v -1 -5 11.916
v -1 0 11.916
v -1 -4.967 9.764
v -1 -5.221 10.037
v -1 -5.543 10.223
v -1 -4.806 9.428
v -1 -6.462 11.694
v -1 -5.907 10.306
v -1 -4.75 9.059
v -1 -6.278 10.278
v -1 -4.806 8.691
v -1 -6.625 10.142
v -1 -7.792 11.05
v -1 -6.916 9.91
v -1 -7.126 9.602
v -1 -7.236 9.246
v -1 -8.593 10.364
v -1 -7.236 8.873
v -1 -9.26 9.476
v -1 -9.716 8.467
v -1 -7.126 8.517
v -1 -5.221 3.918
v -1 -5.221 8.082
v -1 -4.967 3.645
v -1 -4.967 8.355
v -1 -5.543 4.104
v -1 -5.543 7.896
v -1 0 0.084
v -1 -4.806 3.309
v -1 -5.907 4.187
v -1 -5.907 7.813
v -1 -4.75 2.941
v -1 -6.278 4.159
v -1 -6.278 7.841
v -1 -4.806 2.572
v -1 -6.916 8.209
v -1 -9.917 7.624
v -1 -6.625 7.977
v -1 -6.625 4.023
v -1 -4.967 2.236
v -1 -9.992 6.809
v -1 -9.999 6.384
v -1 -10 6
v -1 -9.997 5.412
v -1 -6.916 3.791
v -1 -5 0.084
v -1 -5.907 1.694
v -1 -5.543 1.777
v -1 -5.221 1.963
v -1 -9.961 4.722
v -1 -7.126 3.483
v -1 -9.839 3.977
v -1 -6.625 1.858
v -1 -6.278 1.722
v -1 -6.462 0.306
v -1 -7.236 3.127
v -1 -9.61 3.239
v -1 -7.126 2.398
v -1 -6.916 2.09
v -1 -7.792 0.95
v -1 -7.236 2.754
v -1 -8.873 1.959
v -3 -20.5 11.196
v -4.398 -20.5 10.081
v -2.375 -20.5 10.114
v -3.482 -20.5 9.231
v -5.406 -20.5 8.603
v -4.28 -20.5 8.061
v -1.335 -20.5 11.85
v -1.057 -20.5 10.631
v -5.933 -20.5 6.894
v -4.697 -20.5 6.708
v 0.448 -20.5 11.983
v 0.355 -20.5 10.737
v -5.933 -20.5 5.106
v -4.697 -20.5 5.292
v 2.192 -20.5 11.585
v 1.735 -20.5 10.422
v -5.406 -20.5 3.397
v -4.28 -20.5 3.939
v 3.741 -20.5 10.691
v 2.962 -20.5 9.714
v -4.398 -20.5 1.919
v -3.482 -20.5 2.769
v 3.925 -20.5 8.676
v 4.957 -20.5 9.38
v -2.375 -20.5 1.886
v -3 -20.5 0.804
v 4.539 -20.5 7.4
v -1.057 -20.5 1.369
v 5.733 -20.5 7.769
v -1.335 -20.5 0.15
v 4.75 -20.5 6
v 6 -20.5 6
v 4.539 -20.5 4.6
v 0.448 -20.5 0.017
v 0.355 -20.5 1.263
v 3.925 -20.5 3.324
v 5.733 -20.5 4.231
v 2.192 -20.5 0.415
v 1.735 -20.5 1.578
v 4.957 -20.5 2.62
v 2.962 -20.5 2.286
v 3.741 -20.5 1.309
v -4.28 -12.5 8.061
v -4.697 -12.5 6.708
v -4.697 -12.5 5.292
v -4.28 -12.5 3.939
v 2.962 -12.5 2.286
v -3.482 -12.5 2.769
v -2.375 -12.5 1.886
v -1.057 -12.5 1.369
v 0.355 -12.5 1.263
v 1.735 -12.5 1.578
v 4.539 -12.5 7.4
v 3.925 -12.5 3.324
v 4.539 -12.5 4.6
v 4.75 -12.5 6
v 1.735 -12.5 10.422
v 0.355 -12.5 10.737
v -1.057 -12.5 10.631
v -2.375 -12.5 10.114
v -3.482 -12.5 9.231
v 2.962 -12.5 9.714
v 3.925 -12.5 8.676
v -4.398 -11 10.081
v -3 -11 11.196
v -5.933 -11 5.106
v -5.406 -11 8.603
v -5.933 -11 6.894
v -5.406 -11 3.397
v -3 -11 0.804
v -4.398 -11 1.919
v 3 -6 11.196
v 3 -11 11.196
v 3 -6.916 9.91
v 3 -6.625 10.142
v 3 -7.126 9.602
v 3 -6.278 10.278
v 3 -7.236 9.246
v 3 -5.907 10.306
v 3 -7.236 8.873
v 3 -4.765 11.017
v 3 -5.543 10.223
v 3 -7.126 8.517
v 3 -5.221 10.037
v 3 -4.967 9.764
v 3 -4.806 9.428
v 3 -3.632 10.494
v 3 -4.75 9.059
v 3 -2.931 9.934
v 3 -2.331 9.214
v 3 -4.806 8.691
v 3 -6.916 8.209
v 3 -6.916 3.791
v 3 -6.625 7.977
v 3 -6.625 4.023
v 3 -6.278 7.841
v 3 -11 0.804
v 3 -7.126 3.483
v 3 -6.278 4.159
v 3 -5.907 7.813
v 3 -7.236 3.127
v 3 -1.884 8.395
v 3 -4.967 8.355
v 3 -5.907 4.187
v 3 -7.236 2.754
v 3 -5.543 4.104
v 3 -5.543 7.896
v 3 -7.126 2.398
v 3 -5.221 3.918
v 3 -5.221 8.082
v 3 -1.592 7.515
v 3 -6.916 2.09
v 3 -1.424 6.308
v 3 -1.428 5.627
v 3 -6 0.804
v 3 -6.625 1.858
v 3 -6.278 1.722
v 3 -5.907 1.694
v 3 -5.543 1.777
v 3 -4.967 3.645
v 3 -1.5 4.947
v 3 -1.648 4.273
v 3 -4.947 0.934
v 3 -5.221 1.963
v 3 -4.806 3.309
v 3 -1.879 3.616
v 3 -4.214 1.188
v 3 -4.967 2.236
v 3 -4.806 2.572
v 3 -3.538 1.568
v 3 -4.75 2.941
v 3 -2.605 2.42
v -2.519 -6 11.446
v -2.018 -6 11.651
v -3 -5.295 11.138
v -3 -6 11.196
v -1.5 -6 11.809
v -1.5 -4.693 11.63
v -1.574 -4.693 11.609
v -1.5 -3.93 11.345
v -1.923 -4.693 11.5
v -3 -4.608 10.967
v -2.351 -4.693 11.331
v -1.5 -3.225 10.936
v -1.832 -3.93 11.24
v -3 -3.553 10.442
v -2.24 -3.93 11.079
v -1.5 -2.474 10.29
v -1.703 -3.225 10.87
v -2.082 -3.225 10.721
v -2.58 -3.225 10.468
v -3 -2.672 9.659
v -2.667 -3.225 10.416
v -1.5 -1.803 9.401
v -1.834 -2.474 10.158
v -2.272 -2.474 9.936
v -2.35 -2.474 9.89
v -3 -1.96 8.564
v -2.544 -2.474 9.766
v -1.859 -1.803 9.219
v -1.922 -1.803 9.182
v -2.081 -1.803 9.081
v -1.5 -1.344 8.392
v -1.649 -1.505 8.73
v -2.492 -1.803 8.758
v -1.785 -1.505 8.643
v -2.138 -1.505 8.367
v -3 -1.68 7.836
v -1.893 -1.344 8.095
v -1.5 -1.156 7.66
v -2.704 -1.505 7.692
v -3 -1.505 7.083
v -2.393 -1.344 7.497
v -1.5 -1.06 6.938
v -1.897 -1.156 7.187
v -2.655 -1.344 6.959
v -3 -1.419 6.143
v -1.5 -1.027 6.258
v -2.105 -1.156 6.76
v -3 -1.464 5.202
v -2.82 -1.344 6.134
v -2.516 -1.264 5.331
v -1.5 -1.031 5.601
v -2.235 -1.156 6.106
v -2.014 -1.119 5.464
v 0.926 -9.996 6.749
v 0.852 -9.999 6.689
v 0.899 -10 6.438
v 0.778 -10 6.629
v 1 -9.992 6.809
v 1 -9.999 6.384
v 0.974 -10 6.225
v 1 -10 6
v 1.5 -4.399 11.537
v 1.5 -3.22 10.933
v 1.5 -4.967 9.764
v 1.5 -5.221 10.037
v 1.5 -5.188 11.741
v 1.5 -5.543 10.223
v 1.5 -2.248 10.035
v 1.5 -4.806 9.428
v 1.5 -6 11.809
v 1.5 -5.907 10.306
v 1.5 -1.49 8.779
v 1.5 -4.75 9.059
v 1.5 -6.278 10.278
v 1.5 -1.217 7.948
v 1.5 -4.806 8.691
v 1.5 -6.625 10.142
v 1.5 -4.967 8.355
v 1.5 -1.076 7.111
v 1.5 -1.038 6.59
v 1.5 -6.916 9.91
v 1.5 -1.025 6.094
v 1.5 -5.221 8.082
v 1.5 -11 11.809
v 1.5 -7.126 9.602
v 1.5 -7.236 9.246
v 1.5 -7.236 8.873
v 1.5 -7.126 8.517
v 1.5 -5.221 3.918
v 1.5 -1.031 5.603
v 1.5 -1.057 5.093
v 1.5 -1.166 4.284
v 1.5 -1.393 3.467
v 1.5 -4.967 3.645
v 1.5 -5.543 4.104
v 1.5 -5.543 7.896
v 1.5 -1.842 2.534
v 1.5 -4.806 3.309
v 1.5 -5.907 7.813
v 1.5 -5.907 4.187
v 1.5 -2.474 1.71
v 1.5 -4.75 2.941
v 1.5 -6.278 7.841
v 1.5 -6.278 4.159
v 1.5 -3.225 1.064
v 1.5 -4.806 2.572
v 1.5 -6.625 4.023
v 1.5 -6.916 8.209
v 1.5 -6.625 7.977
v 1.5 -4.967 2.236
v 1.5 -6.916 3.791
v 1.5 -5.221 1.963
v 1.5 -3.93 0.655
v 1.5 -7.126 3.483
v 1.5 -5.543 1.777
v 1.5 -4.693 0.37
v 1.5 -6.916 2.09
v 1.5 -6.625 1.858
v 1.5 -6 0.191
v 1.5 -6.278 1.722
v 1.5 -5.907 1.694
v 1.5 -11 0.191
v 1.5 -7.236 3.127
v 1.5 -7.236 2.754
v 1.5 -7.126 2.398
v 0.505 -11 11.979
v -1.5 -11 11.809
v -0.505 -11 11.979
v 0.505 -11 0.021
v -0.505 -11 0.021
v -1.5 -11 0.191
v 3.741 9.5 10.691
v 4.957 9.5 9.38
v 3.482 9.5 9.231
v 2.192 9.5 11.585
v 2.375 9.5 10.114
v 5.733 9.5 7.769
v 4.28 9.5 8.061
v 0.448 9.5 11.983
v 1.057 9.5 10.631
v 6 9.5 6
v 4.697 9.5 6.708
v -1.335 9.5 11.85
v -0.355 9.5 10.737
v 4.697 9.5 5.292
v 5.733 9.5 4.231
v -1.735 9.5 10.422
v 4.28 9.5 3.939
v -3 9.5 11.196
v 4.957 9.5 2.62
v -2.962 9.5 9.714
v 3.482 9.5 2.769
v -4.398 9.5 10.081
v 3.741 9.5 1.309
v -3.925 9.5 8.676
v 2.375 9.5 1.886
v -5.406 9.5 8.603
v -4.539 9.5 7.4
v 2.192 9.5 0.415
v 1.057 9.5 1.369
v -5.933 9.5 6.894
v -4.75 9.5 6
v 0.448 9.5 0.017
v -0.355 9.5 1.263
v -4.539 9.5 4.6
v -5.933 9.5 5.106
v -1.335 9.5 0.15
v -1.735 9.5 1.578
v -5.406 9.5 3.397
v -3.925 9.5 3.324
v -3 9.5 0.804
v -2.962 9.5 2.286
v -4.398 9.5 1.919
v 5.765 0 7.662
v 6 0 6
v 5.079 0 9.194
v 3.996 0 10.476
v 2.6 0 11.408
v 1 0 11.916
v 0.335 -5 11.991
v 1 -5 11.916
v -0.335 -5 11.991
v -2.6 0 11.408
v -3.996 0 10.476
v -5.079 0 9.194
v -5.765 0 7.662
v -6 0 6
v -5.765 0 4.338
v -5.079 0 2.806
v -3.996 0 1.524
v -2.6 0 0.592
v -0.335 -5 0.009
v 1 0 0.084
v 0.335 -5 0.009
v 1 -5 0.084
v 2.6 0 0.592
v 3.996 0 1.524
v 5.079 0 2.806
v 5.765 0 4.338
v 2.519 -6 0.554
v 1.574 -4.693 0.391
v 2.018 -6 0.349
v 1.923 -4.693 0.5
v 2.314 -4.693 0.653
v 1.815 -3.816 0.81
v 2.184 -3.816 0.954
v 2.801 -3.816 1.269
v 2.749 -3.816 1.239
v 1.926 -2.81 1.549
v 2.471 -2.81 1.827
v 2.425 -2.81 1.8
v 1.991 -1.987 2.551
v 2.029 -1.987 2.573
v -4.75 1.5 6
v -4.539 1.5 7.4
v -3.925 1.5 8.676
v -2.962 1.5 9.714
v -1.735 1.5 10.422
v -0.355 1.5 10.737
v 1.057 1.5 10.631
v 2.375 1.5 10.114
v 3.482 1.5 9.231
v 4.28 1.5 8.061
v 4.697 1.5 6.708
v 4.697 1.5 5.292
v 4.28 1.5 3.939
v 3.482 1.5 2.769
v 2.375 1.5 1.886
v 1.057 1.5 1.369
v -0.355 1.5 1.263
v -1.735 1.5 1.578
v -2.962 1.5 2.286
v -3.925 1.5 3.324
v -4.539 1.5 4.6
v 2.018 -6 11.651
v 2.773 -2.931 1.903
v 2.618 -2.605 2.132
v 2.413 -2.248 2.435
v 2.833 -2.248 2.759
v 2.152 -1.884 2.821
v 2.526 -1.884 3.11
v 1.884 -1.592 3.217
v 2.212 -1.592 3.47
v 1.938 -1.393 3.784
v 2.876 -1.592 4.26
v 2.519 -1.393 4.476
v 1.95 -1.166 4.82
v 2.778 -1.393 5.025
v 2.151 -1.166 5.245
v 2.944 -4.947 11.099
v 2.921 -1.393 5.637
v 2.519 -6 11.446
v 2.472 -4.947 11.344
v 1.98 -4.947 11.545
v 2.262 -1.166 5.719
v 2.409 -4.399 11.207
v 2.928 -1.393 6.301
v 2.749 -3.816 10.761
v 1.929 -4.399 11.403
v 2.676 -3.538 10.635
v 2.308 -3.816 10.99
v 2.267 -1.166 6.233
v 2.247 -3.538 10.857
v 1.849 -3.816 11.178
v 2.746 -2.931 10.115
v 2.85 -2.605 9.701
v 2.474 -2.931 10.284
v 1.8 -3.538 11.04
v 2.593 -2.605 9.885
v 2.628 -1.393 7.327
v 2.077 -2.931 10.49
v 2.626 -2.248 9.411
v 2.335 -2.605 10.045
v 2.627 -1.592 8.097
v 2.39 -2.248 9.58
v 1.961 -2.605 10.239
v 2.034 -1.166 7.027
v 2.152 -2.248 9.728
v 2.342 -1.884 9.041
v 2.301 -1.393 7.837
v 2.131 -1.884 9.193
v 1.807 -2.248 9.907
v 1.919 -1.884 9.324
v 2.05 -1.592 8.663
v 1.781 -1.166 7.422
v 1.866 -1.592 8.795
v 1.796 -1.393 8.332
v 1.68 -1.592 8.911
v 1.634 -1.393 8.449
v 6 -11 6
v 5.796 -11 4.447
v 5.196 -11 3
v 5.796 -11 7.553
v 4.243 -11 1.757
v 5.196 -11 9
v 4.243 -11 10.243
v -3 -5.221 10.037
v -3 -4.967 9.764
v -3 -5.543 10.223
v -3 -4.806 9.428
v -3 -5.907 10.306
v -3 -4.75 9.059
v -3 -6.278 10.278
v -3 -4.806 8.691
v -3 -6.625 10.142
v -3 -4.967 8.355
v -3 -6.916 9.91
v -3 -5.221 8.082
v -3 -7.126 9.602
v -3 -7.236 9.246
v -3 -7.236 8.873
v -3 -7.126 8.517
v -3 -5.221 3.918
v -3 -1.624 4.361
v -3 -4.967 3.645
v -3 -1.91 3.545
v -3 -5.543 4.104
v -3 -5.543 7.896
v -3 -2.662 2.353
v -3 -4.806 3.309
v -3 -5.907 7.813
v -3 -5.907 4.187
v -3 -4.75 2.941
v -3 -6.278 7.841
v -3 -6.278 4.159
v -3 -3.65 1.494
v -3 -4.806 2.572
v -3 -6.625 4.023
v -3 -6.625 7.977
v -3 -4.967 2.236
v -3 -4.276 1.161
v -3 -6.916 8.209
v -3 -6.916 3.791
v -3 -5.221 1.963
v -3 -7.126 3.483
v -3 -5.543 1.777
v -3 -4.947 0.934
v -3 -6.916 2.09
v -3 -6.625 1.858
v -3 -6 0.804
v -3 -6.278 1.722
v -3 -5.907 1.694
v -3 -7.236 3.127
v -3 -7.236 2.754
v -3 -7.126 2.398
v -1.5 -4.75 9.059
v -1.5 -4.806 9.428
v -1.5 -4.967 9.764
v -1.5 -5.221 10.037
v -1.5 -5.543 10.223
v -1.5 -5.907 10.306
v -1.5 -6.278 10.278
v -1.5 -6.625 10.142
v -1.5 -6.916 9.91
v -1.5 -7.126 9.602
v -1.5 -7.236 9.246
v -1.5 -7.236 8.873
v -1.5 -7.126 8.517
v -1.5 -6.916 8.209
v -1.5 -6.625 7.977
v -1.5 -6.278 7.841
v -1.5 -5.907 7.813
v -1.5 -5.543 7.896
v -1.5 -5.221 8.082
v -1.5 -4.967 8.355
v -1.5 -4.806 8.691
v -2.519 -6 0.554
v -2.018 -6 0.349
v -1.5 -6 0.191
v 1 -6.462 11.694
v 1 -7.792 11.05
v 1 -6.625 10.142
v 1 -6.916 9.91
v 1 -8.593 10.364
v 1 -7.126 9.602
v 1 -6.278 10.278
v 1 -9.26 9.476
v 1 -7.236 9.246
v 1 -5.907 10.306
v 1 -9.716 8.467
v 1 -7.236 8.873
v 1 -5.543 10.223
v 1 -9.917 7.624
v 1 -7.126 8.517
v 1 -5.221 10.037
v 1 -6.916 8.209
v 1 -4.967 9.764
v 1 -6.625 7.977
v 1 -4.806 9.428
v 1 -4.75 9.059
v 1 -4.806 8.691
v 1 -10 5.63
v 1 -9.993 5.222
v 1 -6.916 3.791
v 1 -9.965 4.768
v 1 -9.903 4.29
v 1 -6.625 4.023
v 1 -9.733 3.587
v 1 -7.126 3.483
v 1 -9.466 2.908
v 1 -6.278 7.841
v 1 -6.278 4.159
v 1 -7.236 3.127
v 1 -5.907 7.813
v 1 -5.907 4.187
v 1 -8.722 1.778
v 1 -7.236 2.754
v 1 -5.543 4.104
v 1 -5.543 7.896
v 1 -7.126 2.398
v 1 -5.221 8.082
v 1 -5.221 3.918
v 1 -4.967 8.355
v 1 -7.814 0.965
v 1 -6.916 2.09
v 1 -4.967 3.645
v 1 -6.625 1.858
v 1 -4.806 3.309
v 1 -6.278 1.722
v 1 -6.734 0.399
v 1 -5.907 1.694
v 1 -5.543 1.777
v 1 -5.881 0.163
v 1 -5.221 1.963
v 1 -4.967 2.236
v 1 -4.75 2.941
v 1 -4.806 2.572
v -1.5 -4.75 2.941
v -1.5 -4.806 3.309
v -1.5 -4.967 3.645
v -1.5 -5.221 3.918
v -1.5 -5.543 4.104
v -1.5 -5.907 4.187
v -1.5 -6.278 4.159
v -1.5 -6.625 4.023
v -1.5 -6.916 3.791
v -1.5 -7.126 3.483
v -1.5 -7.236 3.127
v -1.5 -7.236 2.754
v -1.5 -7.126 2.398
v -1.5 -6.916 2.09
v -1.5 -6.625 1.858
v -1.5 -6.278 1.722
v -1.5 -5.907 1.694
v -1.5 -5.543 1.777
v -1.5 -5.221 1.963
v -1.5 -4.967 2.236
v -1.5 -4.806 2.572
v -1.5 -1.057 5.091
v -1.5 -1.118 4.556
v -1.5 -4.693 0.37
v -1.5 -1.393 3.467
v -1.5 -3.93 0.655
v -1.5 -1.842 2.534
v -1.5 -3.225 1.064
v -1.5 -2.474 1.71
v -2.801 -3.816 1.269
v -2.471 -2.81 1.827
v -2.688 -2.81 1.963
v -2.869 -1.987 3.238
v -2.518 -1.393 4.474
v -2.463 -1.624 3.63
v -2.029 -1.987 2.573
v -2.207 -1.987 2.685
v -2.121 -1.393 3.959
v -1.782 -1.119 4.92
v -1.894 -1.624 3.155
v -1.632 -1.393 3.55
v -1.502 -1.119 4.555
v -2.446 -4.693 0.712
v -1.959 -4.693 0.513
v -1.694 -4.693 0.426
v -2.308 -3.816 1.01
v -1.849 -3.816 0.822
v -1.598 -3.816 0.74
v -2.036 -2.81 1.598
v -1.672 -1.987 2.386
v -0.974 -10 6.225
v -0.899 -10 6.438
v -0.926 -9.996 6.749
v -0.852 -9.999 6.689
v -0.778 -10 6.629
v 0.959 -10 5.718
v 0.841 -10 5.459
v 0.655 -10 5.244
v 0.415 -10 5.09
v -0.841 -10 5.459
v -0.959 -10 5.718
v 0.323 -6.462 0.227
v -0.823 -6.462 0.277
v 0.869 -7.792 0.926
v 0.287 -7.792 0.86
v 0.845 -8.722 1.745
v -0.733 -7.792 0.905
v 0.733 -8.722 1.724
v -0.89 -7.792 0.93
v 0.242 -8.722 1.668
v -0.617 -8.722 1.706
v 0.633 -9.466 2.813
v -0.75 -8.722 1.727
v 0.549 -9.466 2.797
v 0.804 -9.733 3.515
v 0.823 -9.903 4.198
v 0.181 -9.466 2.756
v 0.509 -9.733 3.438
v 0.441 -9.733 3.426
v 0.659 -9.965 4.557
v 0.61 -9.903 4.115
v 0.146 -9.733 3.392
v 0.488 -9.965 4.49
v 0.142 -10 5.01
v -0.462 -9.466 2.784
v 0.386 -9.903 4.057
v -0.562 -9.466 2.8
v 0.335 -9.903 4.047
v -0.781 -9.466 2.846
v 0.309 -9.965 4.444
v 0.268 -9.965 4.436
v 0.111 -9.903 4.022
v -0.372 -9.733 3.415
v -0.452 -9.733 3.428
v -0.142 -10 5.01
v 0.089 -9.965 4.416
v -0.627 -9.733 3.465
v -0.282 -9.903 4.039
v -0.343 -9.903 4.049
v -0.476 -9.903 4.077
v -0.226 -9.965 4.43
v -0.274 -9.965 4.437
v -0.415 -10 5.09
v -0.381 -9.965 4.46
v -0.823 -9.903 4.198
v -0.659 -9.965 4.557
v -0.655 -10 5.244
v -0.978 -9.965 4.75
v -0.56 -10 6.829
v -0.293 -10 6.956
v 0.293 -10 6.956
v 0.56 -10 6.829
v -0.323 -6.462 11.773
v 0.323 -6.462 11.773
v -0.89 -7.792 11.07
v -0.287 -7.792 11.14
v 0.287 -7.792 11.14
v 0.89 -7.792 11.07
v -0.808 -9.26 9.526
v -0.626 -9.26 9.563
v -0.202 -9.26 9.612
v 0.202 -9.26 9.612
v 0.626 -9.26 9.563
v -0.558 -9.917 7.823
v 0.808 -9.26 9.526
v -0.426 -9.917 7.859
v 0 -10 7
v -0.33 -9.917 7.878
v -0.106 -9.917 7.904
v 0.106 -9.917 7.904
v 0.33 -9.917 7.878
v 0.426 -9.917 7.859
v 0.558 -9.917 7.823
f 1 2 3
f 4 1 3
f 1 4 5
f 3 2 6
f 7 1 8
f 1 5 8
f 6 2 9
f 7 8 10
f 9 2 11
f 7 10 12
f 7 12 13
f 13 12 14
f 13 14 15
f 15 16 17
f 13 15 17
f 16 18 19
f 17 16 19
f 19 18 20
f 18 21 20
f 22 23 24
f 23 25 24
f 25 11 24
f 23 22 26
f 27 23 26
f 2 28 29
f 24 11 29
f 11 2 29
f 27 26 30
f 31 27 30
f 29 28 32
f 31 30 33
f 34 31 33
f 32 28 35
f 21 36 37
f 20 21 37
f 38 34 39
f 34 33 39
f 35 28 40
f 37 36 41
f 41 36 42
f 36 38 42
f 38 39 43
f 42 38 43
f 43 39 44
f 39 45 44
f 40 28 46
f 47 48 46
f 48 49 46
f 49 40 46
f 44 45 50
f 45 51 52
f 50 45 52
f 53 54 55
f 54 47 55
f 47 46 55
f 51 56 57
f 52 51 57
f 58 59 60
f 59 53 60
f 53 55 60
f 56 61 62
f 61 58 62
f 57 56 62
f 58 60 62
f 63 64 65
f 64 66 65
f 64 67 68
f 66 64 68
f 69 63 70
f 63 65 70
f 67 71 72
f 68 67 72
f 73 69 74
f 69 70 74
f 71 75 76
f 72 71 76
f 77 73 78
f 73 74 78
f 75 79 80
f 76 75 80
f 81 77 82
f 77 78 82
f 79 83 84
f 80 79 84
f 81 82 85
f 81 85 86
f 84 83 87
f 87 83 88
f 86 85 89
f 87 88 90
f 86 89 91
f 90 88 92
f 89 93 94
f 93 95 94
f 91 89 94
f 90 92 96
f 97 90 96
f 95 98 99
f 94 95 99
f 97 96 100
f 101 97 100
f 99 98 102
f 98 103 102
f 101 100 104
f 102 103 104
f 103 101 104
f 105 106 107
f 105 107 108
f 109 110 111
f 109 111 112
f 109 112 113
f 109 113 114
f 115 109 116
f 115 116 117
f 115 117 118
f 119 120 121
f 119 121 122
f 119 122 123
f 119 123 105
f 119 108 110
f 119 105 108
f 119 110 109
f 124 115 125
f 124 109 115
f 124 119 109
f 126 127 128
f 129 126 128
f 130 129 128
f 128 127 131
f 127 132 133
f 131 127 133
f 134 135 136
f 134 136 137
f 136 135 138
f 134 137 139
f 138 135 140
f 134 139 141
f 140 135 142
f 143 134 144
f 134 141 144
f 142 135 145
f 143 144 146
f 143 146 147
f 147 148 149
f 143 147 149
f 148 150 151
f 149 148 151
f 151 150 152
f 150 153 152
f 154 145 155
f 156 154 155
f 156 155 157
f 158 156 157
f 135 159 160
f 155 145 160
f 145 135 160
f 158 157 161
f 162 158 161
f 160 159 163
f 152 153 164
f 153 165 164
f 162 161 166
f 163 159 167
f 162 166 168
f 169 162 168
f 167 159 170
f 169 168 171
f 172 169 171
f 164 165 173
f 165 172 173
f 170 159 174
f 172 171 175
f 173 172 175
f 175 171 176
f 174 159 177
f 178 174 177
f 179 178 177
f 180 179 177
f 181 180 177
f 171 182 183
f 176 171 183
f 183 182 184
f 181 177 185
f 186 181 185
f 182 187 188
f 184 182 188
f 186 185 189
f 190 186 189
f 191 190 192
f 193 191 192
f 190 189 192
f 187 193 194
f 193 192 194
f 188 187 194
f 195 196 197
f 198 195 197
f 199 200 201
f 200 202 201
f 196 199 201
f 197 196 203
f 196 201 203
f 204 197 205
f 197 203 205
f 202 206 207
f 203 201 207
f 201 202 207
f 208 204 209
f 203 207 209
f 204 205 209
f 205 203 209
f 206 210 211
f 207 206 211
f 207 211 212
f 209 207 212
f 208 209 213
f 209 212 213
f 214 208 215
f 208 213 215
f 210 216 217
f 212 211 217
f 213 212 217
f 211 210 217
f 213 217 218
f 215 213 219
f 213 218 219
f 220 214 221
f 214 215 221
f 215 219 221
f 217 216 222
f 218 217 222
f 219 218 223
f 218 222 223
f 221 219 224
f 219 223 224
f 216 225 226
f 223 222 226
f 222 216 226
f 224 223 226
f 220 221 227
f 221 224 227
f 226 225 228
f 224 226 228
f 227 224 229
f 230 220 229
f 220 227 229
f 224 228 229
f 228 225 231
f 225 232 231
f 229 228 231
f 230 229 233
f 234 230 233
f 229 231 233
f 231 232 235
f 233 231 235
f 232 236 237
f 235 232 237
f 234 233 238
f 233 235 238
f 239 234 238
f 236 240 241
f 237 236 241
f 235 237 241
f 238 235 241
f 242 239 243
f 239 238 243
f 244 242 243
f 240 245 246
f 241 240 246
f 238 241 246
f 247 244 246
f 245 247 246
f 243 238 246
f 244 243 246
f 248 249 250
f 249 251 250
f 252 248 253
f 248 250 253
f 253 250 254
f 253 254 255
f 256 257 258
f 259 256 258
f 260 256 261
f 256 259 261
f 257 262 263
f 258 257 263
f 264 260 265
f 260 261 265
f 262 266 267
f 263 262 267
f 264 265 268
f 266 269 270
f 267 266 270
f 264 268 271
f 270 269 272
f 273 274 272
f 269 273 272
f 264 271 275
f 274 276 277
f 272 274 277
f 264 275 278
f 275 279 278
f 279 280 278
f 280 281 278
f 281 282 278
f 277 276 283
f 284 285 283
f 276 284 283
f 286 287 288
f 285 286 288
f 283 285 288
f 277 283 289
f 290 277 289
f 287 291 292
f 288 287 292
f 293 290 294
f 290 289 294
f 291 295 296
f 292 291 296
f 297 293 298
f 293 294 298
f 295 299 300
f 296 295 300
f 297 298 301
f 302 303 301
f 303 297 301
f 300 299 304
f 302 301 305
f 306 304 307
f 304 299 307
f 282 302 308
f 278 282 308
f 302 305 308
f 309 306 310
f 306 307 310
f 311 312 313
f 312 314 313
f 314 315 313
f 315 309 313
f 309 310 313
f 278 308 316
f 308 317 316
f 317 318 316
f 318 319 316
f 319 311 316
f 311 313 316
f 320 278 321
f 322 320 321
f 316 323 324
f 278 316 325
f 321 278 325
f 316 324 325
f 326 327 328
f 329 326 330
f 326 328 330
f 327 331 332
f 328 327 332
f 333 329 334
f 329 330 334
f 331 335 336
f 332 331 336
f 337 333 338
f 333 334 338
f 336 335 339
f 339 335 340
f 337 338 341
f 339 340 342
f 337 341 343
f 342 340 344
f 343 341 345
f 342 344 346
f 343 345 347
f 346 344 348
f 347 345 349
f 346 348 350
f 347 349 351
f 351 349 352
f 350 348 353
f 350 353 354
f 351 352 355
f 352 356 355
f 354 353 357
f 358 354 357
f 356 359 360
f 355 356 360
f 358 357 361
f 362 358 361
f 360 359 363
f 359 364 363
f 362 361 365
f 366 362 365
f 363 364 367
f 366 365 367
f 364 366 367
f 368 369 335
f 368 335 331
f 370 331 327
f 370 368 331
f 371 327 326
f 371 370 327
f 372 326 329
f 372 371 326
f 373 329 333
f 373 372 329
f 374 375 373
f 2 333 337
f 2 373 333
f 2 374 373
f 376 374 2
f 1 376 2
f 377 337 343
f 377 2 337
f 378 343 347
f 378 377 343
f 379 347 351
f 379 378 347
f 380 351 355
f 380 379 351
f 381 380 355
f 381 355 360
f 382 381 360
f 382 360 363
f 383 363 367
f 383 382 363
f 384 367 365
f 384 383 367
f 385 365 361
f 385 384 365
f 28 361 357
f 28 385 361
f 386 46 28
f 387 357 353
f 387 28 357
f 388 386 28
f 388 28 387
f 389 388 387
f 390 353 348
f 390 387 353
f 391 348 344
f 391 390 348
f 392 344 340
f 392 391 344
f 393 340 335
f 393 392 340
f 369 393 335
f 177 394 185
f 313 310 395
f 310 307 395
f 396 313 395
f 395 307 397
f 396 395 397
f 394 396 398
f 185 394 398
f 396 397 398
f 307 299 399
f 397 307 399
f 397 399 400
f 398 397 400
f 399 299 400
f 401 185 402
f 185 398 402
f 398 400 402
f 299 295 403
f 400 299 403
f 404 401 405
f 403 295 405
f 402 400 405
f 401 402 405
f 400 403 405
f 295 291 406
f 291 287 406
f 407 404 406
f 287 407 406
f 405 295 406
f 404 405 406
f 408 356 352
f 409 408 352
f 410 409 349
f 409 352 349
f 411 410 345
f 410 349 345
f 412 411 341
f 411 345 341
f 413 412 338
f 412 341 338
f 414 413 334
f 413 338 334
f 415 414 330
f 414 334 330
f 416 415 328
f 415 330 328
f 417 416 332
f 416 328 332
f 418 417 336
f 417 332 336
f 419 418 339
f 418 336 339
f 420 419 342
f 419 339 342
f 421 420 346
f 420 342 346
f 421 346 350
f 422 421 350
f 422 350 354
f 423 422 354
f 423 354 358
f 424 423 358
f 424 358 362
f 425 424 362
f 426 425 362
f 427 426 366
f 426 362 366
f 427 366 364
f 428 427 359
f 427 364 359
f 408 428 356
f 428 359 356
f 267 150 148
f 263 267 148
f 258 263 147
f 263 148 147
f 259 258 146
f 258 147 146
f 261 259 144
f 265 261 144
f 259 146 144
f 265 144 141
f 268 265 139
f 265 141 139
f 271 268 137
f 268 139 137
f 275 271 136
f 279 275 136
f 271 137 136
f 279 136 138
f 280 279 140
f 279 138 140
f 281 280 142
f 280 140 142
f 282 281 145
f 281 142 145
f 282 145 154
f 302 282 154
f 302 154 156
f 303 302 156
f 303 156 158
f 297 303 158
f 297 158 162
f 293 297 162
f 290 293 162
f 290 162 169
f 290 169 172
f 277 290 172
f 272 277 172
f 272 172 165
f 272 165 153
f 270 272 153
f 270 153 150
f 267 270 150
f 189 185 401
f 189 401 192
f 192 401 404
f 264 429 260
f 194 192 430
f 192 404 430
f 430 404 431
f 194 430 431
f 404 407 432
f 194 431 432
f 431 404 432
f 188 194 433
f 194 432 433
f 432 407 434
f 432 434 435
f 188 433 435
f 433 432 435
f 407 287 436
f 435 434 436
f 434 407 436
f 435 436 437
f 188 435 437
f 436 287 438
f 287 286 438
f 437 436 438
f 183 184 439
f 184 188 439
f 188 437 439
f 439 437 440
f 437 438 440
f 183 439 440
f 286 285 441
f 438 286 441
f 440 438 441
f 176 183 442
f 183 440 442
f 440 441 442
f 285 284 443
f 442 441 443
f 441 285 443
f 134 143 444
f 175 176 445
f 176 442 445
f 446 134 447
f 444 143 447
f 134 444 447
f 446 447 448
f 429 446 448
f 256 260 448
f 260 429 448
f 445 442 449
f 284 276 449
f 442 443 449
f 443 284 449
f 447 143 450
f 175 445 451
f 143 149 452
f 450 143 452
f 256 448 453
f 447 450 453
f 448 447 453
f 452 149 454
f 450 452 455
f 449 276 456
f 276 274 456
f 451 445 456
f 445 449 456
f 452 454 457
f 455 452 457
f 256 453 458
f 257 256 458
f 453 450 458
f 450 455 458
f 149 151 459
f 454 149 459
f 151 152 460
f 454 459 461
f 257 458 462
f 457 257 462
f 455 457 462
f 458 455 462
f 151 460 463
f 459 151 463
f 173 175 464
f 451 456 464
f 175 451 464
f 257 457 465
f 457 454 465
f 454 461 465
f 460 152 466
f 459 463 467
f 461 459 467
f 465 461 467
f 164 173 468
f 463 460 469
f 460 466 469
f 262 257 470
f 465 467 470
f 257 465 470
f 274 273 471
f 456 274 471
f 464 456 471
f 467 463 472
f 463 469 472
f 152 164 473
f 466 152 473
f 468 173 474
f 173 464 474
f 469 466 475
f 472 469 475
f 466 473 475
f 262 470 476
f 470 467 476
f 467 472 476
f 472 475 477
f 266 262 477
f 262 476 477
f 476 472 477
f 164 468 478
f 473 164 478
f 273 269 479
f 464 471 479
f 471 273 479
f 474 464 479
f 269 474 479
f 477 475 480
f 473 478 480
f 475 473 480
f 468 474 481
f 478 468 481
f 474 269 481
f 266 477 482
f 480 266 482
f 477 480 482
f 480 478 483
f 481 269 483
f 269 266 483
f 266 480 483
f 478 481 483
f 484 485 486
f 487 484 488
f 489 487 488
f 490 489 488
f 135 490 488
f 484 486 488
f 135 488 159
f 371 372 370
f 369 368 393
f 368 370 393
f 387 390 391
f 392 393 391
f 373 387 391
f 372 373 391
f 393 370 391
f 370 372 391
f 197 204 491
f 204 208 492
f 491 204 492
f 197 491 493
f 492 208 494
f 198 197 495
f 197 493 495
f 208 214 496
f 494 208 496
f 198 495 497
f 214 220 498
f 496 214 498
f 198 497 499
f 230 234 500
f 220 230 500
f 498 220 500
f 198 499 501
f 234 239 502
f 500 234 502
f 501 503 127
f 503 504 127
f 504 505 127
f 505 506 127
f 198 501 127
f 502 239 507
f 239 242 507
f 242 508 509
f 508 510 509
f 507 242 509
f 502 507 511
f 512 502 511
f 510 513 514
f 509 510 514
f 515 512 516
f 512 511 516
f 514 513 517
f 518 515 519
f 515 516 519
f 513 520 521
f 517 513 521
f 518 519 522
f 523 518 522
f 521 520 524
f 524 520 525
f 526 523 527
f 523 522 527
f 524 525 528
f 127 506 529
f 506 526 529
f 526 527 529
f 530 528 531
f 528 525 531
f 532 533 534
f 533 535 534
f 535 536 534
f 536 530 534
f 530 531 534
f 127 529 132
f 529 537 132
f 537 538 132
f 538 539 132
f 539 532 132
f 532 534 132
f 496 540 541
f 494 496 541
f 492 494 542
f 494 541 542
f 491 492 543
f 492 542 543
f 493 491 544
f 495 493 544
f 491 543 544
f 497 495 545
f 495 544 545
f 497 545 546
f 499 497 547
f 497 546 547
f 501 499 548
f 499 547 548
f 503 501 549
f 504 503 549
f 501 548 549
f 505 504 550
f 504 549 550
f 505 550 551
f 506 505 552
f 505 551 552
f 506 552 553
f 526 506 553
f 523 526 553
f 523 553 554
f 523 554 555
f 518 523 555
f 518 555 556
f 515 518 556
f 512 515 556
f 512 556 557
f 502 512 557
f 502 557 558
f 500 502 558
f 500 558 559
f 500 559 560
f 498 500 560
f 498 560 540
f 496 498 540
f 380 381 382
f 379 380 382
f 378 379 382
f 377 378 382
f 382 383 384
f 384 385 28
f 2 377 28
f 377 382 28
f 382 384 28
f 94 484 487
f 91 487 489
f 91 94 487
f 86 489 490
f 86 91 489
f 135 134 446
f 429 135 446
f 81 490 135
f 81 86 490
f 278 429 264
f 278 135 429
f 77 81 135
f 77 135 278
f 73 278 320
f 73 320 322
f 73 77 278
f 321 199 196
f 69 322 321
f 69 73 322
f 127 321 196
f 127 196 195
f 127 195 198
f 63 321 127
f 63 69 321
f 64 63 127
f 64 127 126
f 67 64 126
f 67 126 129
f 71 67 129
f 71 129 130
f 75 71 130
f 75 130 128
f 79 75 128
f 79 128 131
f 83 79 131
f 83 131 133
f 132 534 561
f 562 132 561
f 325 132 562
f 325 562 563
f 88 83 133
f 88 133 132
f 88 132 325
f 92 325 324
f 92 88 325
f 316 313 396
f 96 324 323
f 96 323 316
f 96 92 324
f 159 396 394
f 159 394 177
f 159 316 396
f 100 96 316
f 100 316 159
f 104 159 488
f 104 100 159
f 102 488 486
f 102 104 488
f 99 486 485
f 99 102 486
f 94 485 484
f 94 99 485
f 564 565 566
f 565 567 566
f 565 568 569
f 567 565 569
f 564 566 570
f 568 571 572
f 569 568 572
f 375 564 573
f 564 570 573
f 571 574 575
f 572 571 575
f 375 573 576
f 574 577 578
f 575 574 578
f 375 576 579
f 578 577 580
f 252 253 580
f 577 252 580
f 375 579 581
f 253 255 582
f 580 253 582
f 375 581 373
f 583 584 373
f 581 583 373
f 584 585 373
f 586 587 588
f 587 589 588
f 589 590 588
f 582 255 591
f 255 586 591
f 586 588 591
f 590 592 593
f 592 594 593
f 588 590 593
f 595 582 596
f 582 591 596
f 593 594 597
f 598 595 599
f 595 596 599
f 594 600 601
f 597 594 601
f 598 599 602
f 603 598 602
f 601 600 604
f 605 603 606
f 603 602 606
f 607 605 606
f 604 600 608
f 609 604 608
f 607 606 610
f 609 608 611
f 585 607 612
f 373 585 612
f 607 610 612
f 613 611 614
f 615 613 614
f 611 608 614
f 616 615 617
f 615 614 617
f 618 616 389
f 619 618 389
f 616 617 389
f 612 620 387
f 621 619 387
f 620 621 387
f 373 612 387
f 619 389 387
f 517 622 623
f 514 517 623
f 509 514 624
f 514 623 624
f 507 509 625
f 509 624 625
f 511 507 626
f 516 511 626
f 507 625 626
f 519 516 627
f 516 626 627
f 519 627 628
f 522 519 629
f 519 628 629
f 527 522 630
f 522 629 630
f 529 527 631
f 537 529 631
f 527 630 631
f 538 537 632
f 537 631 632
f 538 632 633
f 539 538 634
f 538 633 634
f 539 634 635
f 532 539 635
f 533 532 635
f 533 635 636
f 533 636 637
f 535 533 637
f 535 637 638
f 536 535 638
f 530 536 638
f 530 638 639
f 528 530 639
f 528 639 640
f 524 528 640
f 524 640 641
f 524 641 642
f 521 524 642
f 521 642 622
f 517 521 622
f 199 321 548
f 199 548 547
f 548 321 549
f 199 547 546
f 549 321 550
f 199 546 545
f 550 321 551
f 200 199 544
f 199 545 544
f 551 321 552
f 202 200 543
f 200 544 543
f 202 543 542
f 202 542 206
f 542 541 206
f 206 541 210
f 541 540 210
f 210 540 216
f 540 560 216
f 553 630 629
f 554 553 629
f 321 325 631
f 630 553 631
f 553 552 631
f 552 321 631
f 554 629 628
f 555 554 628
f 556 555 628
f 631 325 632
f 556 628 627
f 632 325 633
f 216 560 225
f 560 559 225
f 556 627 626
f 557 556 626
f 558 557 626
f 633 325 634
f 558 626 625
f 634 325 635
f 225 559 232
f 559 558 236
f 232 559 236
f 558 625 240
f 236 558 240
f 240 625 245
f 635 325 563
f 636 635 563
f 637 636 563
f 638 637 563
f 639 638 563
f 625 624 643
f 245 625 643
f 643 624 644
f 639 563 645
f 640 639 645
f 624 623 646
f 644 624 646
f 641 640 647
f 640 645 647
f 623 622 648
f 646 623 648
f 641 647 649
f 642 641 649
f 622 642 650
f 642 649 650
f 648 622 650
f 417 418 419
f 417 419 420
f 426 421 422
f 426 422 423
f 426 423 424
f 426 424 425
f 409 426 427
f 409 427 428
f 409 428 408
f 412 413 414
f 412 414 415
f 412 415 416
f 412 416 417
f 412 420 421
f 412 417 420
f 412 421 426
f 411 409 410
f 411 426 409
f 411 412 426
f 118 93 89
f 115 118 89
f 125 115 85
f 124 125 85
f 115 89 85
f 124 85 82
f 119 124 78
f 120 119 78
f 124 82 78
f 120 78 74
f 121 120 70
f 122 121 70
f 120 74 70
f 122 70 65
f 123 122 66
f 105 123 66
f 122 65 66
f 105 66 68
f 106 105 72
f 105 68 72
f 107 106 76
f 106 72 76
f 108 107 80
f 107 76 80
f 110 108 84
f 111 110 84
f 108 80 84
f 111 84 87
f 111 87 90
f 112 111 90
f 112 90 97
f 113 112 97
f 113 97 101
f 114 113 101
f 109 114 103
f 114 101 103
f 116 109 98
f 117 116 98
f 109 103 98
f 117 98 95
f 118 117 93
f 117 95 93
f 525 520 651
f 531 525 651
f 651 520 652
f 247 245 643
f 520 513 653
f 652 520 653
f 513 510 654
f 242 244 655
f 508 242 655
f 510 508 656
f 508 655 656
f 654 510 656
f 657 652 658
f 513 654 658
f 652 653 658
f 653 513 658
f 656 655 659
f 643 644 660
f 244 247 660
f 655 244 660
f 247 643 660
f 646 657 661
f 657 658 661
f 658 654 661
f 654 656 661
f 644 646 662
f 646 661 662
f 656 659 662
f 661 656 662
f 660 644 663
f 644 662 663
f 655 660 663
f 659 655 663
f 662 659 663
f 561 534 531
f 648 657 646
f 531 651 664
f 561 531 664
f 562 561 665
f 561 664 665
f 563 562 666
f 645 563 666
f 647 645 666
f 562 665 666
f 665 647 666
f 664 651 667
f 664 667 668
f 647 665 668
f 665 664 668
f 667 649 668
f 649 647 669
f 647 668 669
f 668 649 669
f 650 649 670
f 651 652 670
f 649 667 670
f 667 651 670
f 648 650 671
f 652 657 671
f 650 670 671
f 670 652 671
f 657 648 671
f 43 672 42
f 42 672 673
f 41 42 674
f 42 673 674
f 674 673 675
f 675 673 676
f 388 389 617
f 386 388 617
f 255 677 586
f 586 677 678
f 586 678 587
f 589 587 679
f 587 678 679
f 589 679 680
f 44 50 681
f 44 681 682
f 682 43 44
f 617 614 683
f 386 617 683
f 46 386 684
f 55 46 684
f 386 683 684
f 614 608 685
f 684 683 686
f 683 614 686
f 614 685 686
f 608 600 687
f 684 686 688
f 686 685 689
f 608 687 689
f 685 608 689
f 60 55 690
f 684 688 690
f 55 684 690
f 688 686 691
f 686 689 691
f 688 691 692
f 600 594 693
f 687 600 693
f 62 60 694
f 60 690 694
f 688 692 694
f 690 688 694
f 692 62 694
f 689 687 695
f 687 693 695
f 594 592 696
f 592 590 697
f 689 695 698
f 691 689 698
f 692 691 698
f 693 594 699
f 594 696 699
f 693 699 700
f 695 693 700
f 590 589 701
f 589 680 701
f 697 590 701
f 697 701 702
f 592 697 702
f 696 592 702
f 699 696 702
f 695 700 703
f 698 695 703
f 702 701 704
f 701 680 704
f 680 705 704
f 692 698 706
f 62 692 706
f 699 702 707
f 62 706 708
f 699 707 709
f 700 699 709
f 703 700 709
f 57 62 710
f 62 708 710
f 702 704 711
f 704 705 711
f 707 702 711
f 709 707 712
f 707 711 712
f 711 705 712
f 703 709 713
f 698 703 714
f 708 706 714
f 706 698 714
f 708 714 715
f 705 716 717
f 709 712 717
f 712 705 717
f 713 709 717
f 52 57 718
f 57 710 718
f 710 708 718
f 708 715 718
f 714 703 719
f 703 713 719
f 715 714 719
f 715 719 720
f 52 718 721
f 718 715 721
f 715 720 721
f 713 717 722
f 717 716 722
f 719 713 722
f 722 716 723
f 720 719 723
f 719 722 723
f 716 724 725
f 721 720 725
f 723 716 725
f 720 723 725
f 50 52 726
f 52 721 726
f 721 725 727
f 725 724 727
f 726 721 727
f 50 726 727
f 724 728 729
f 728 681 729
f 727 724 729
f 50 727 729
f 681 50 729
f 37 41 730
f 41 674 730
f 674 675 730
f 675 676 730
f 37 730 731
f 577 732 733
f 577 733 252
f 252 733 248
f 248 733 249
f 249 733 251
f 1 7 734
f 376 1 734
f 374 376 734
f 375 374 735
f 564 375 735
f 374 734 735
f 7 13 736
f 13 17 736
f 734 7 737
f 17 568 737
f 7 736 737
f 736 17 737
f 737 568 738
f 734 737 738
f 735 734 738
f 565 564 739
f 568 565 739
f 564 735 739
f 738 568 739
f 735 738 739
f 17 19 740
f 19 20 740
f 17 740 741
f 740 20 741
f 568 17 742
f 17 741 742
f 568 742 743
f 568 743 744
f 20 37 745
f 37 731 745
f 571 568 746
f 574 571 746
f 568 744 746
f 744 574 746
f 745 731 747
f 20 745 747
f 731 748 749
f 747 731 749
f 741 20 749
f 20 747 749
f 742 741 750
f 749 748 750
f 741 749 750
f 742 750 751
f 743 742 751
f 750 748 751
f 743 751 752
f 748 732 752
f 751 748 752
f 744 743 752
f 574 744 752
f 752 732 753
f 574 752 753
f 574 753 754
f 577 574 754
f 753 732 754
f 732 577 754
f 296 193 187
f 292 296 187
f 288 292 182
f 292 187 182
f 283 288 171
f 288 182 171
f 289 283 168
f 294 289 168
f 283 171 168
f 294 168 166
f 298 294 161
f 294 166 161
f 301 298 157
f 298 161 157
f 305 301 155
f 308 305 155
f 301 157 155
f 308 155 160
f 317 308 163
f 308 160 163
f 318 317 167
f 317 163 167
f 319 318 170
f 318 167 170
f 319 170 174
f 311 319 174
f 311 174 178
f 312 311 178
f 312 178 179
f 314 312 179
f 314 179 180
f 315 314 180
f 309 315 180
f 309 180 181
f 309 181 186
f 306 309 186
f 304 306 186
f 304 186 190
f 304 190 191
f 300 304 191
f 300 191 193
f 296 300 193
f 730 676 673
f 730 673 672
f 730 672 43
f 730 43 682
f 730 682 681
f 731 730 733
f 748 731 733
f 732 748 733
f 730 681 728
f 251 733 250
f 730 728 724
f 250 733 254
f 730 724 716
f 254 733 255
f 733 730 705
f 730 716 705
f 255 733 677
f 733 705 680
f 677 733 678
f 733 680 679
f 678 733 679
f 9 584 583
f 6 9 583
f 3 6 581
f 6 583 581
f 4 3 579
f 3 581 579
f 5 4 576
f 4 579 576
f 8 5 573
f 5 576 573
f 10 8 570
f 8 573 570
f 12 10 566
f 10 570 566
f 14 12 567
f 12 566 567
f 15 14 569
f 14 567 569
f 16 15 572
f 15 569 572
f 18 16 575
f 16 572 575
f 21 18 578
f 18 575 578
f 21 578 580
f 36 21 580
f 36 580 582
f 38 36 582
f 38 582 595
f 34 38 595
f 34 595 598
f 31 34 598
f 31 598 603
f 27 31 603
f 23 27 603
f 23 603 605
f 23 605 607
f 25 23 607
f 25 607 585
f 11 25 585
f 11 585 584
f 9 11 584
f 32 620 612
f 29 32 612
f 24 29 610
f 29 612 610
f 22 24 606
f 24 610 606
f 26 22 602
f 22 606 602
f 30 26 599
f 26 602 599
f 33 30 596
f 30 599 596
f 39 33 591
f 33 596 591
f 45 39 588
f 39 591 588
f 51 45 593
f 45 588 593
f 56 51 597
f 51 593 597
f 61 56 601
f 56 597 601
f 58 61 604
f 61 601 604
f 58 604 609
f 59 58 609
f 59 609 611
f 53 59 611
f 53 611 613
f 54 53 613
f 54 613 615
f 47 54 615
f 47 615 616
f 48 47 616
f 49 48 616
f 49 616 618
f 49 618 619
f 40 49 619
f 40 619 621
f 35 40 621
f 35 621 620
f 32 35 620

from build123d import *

# Parameters (mm, degrees)
F1_DEPTH       = 12
F2_W           = 18.0606292561
F2_H           = 16.2687138654
F2_R           = 6
F3_DEPTH       = 35.7
F4_R           = 1.25
F5_DEPTH       = 25
F6_R           = 4.75
F7_DEPTH       = 8
F8_R           = 4.75
F9_DEPTH       = 8
F10_T2_ANGLE   = 257.9249090799
F10_T4_ANGLE   = 257.9249090799
F10_2_T2_ANGLE = 254.2577543973
F10_2_T4_ANGLE = 254.2577543973
F10_2_T6_ANGLE = 254.2577543973
F10_2_T8_ANGLE = 254.2577543973
F12_R          = 1.25
F13_DEPTH      = 15


# Not quite as in the source:
# - a fillet or chamfer that OpenCascade refuses, or shapes differently, is made with other operations: its cross-section is extruded or revolved along the edge and cut away or added
# - two fillets or chamfers of one size are made in one step


with BuildPart() as f1:
    # F0 (on Top) → F1 (new body)
    with BuildSketch(Plane.XY):
        Polygon((6, 9.5), (-6, 9.5), (-6, 0), (-1, 0), (-1, -10), (1, -10), (1, 0), (6, 0), align=None)
    extrude(amount=F1_DEPTH)


with BuildPart() as f1b:
    # F0 (on Top) → F1, piece 2 (new body)
    with BuildSketch(Plane.XY):
        Polygon((-6, -11), (-6, -20.5), (6, -20.5), (6, -11), (3, -11), (3, -1), (1.5, -1), (1.5, -11), (-1.5, -11), (-1.5, -1), (-3, -1), (-3, -11), align=None)
    extrude(amount=F1_DEPTH)


with BuildPart() as f3_tool:
    # F2 (on face) → F3 (new body)
    with BuildSketch(Plane.XZ.offset(20.5)):
        with Locations((0.2045785077, 5.5509812664)):
            Rectangle(F2_W, F2_H)
        with Locations((0, 6)):
            Circle(F2_R, mode=Mode.SUBTRACT)
    extrude(amount=-F3_DEPTH)


with BuildPart() as f1_1:
    add(f1.part)

    # F3: cut by f3_tool
    add(f3_tool.part, mode=Mode.SUBTRACT)


with BuildPart() as f1b_1:
    add(f1b.part)

    # F3: cut by f3_tool
    add(f3_tool.part, mode=Mode.SUBTRACT)


with BuildPart() as f5_tool:
    # F4 (on face) → F5 (new body)
    with BuildSketch(Plane.YZ.offset(3)):
        with Locations((-6, 2.9405249807)):
            Circle(F4_R)
    extrude(amount=-F5_DEPTH)


with BuildPart() as f1_2:
    add(f1_1.part)

    # F5: cut by f5_tool
    add(f5_tool.part, mode=Mode.SUBTRACT)

    # F8 (on face) → F9 (cut)
    with BuildSketch(Plane(origin=(0, 9.5, 0), x_dir=(-1, 0, 0), z_dir=(0, 1, 0))):
        with Locations((0, 6)):
            Circle(F8_R)
    extrude(amount=-F9_DEPTH, mode=Mode.SUBTRACT)

    # F10: fillet of radius 5 on 2 edges, made by hand

    # F10_s1 → F10_t2 (revolve, cut)
    with BuildSketch(Plane(origin=(-2.9336228252, 0, 3.6275803689), x_dir=(0, 1, 0), z_dir=(-0.6288109985, 0, 0.7775581831))):
        with BuildLine():
            ThreePointArc((-5, -9.7728659911), (-8.5355339059, -8.308399897), (-10, -4.7728659911))
            Line((-10, -4.7728659911), (-10, -9.7728659911))
            Line((-10, -9.7728659911), (-5, -9.7728659911))
        make_face()
    revolve(axis=Axis((0, -10, 6), (0, 1, 0)), revolution_arc=F10_T2_ANGLE, mode=Mode.SUBTRACT)

    # F10_s3 → F10_t4 (revolve, cut)
    with BuildSketch(Plane(origin=(-2.9336228252, 0, 3.6275803689), x_dir=(0, 1, 0), z_dir=(0.6288109985, 0, -0.7775581831))):
        with BuildLine():
            ThreePointArc((-5, -2.2271340089), (-8.5355339059, -0.7626679148), (-10, 2.7728659911))
            Line((-10, 2.7728659911), (-10, -2.2271340089))
            Line((-10, -2.2271340089), (-5, -2.2271340089))
        make_face()
    revolve(axis=Axis((0, -10, 6), (0, 1, 0)), revolution_arc=F10_T4_ANGLE, mode=Mode.SUBTRACT)


with BuildPart() as f1b_2:
    add(f1b_1.part)

    # F5: cut by f5_tool
    add(f5_tool.part, mode=Mode.SUBTRACT)

    # F6 (on face) → F7 (cut)
    with BuildSketch(Plane.XZ.offset(20.5)):
        with Locations((0, 6)):
            Circle(F6_R)
    extrude(amount=-F7_DEPTH, mode=Mode.SUBTRACT)

    # F10#2: fillet of radius 5 on 4 edges, made by hand

    # F10_2_s1 → F10_2_t2 (revolve, cut)
    with BuildSketch(Plane(origin=(2.6305512341, 0, 1.5577100829), x_dir=(0, 1, 0), z_dir=(-0.8604543293, 0, -0.5095275725))):
        with BuildLine():
            ThreePointArc((-6, 0.8372740241), (-2.4644660941, -0.62719207), (-1, -4.1627259759))
            Line((-1, -4.1627259759), (-1, 0.8372740241))
            Line((-1, 0.8372740241), (-6, 0.8372740241))
        make_face()
    revolve(axis=Axis((0, -1, 6), (0, -1, 0)), revolution_arc=F10_2_T2_ANGLE, mode=Mode.SUBTRACT)

    # F10_2_s3 → F10_2_t4 (revolve, cut)
    with BuildSketch(Plane(origin=(1.4900240777, 0, 5.6038103325), x_dir=(0, 1, 0), z_dir=(-0.2569661675, 0, -0.9664203996))):
        with BuildLine():
            ThreePointArc((-6, 4.4582029949), (-2.4644660941, 2.9937369009), (-1, -0.5417970051))
            Line((-1, -0.5417970051), (-1, 4.4582029949))
            Line((-1, 4.4582029949), (-6, 4.4582029949))
        make_face()
    revolve(axis=Axis((0, -1, 6), (0, -1, 0)), revolution_arc=F10_2_T4_ANGLE, mode=Mode.SUBTRACT)

    # F10_2_s5 → F10_2_t6 (revolve, cut)
    with BuildSketch(Plane(origin=(2.6305512341, 0, 1.5577100829), x_dir=(0, 1, 0), z_dir=(0.8604543293, 0, 0.5095275725))):
        with BuildLine():
            ThreePointArc((-6, 11.1627259759), (-2.4644660941, 9.6982598818), (-1, 6.1627259759))
            Line((-1, 6.1627259759), (-1, 11.1627259759))
            Line((-1, 11.1627259759), (-6, 11.1627259759))
        make_face()
    revolve(axis=Axis((0, -1, 6), (0, -1, 0)), revolution_arc=F10_2_T6_ANGLE, mode=Mode.SUBTRACT)

    # F10_2_s7 → F10_2_t8 (revolve, cut)
    with BuildSketch(Plane(origin=(1.4900240777, 0, 5.6038103325), x_dir=(0, 1, 0), z_dir=(0.2569661675, 0, 0.9664203996))):
        with BuildLine():
            ThreePointArc((-6, 7.5417970051), (-2.4644660941, 6.077330911), (-1, 2.5417970051))
            Line((-1, 2.5417970051), (-1, 7.5417970051))
            Line((-1, 7.5417970051), (-6, 7.5417970051))
        make_face()
    revolve(axis=Axis((0, -1, 6), (0, -1, 0)), revolution_arc=F10_2_T8_ANGLE, mode=Mode.SUBTRACT)


with BuildPart() as f13_tool:
    # F12 (on face) → F13 (new body)
    with BuildSketch(Plane.YZ.offset(3)):
        with Locations((-6, 9.0594750193)):
            Circle(F12_R)
    extrude(amount=-F13_DEPTH)


with BuildPart() as f1_3:
    add(f1_2.part)

    # F13: cut by f13_tool
    add(f13_tool.part, mode=Mode.SUBTRACT)


with BuildPart() as f1b_3:
    add(f1b_2.part)

    # F13: cut by f13_tool
    add(f13_tool.part, mode=Mode.SUBTRACT)


solid = Compound([f1_3.part, f1b_3.part])
